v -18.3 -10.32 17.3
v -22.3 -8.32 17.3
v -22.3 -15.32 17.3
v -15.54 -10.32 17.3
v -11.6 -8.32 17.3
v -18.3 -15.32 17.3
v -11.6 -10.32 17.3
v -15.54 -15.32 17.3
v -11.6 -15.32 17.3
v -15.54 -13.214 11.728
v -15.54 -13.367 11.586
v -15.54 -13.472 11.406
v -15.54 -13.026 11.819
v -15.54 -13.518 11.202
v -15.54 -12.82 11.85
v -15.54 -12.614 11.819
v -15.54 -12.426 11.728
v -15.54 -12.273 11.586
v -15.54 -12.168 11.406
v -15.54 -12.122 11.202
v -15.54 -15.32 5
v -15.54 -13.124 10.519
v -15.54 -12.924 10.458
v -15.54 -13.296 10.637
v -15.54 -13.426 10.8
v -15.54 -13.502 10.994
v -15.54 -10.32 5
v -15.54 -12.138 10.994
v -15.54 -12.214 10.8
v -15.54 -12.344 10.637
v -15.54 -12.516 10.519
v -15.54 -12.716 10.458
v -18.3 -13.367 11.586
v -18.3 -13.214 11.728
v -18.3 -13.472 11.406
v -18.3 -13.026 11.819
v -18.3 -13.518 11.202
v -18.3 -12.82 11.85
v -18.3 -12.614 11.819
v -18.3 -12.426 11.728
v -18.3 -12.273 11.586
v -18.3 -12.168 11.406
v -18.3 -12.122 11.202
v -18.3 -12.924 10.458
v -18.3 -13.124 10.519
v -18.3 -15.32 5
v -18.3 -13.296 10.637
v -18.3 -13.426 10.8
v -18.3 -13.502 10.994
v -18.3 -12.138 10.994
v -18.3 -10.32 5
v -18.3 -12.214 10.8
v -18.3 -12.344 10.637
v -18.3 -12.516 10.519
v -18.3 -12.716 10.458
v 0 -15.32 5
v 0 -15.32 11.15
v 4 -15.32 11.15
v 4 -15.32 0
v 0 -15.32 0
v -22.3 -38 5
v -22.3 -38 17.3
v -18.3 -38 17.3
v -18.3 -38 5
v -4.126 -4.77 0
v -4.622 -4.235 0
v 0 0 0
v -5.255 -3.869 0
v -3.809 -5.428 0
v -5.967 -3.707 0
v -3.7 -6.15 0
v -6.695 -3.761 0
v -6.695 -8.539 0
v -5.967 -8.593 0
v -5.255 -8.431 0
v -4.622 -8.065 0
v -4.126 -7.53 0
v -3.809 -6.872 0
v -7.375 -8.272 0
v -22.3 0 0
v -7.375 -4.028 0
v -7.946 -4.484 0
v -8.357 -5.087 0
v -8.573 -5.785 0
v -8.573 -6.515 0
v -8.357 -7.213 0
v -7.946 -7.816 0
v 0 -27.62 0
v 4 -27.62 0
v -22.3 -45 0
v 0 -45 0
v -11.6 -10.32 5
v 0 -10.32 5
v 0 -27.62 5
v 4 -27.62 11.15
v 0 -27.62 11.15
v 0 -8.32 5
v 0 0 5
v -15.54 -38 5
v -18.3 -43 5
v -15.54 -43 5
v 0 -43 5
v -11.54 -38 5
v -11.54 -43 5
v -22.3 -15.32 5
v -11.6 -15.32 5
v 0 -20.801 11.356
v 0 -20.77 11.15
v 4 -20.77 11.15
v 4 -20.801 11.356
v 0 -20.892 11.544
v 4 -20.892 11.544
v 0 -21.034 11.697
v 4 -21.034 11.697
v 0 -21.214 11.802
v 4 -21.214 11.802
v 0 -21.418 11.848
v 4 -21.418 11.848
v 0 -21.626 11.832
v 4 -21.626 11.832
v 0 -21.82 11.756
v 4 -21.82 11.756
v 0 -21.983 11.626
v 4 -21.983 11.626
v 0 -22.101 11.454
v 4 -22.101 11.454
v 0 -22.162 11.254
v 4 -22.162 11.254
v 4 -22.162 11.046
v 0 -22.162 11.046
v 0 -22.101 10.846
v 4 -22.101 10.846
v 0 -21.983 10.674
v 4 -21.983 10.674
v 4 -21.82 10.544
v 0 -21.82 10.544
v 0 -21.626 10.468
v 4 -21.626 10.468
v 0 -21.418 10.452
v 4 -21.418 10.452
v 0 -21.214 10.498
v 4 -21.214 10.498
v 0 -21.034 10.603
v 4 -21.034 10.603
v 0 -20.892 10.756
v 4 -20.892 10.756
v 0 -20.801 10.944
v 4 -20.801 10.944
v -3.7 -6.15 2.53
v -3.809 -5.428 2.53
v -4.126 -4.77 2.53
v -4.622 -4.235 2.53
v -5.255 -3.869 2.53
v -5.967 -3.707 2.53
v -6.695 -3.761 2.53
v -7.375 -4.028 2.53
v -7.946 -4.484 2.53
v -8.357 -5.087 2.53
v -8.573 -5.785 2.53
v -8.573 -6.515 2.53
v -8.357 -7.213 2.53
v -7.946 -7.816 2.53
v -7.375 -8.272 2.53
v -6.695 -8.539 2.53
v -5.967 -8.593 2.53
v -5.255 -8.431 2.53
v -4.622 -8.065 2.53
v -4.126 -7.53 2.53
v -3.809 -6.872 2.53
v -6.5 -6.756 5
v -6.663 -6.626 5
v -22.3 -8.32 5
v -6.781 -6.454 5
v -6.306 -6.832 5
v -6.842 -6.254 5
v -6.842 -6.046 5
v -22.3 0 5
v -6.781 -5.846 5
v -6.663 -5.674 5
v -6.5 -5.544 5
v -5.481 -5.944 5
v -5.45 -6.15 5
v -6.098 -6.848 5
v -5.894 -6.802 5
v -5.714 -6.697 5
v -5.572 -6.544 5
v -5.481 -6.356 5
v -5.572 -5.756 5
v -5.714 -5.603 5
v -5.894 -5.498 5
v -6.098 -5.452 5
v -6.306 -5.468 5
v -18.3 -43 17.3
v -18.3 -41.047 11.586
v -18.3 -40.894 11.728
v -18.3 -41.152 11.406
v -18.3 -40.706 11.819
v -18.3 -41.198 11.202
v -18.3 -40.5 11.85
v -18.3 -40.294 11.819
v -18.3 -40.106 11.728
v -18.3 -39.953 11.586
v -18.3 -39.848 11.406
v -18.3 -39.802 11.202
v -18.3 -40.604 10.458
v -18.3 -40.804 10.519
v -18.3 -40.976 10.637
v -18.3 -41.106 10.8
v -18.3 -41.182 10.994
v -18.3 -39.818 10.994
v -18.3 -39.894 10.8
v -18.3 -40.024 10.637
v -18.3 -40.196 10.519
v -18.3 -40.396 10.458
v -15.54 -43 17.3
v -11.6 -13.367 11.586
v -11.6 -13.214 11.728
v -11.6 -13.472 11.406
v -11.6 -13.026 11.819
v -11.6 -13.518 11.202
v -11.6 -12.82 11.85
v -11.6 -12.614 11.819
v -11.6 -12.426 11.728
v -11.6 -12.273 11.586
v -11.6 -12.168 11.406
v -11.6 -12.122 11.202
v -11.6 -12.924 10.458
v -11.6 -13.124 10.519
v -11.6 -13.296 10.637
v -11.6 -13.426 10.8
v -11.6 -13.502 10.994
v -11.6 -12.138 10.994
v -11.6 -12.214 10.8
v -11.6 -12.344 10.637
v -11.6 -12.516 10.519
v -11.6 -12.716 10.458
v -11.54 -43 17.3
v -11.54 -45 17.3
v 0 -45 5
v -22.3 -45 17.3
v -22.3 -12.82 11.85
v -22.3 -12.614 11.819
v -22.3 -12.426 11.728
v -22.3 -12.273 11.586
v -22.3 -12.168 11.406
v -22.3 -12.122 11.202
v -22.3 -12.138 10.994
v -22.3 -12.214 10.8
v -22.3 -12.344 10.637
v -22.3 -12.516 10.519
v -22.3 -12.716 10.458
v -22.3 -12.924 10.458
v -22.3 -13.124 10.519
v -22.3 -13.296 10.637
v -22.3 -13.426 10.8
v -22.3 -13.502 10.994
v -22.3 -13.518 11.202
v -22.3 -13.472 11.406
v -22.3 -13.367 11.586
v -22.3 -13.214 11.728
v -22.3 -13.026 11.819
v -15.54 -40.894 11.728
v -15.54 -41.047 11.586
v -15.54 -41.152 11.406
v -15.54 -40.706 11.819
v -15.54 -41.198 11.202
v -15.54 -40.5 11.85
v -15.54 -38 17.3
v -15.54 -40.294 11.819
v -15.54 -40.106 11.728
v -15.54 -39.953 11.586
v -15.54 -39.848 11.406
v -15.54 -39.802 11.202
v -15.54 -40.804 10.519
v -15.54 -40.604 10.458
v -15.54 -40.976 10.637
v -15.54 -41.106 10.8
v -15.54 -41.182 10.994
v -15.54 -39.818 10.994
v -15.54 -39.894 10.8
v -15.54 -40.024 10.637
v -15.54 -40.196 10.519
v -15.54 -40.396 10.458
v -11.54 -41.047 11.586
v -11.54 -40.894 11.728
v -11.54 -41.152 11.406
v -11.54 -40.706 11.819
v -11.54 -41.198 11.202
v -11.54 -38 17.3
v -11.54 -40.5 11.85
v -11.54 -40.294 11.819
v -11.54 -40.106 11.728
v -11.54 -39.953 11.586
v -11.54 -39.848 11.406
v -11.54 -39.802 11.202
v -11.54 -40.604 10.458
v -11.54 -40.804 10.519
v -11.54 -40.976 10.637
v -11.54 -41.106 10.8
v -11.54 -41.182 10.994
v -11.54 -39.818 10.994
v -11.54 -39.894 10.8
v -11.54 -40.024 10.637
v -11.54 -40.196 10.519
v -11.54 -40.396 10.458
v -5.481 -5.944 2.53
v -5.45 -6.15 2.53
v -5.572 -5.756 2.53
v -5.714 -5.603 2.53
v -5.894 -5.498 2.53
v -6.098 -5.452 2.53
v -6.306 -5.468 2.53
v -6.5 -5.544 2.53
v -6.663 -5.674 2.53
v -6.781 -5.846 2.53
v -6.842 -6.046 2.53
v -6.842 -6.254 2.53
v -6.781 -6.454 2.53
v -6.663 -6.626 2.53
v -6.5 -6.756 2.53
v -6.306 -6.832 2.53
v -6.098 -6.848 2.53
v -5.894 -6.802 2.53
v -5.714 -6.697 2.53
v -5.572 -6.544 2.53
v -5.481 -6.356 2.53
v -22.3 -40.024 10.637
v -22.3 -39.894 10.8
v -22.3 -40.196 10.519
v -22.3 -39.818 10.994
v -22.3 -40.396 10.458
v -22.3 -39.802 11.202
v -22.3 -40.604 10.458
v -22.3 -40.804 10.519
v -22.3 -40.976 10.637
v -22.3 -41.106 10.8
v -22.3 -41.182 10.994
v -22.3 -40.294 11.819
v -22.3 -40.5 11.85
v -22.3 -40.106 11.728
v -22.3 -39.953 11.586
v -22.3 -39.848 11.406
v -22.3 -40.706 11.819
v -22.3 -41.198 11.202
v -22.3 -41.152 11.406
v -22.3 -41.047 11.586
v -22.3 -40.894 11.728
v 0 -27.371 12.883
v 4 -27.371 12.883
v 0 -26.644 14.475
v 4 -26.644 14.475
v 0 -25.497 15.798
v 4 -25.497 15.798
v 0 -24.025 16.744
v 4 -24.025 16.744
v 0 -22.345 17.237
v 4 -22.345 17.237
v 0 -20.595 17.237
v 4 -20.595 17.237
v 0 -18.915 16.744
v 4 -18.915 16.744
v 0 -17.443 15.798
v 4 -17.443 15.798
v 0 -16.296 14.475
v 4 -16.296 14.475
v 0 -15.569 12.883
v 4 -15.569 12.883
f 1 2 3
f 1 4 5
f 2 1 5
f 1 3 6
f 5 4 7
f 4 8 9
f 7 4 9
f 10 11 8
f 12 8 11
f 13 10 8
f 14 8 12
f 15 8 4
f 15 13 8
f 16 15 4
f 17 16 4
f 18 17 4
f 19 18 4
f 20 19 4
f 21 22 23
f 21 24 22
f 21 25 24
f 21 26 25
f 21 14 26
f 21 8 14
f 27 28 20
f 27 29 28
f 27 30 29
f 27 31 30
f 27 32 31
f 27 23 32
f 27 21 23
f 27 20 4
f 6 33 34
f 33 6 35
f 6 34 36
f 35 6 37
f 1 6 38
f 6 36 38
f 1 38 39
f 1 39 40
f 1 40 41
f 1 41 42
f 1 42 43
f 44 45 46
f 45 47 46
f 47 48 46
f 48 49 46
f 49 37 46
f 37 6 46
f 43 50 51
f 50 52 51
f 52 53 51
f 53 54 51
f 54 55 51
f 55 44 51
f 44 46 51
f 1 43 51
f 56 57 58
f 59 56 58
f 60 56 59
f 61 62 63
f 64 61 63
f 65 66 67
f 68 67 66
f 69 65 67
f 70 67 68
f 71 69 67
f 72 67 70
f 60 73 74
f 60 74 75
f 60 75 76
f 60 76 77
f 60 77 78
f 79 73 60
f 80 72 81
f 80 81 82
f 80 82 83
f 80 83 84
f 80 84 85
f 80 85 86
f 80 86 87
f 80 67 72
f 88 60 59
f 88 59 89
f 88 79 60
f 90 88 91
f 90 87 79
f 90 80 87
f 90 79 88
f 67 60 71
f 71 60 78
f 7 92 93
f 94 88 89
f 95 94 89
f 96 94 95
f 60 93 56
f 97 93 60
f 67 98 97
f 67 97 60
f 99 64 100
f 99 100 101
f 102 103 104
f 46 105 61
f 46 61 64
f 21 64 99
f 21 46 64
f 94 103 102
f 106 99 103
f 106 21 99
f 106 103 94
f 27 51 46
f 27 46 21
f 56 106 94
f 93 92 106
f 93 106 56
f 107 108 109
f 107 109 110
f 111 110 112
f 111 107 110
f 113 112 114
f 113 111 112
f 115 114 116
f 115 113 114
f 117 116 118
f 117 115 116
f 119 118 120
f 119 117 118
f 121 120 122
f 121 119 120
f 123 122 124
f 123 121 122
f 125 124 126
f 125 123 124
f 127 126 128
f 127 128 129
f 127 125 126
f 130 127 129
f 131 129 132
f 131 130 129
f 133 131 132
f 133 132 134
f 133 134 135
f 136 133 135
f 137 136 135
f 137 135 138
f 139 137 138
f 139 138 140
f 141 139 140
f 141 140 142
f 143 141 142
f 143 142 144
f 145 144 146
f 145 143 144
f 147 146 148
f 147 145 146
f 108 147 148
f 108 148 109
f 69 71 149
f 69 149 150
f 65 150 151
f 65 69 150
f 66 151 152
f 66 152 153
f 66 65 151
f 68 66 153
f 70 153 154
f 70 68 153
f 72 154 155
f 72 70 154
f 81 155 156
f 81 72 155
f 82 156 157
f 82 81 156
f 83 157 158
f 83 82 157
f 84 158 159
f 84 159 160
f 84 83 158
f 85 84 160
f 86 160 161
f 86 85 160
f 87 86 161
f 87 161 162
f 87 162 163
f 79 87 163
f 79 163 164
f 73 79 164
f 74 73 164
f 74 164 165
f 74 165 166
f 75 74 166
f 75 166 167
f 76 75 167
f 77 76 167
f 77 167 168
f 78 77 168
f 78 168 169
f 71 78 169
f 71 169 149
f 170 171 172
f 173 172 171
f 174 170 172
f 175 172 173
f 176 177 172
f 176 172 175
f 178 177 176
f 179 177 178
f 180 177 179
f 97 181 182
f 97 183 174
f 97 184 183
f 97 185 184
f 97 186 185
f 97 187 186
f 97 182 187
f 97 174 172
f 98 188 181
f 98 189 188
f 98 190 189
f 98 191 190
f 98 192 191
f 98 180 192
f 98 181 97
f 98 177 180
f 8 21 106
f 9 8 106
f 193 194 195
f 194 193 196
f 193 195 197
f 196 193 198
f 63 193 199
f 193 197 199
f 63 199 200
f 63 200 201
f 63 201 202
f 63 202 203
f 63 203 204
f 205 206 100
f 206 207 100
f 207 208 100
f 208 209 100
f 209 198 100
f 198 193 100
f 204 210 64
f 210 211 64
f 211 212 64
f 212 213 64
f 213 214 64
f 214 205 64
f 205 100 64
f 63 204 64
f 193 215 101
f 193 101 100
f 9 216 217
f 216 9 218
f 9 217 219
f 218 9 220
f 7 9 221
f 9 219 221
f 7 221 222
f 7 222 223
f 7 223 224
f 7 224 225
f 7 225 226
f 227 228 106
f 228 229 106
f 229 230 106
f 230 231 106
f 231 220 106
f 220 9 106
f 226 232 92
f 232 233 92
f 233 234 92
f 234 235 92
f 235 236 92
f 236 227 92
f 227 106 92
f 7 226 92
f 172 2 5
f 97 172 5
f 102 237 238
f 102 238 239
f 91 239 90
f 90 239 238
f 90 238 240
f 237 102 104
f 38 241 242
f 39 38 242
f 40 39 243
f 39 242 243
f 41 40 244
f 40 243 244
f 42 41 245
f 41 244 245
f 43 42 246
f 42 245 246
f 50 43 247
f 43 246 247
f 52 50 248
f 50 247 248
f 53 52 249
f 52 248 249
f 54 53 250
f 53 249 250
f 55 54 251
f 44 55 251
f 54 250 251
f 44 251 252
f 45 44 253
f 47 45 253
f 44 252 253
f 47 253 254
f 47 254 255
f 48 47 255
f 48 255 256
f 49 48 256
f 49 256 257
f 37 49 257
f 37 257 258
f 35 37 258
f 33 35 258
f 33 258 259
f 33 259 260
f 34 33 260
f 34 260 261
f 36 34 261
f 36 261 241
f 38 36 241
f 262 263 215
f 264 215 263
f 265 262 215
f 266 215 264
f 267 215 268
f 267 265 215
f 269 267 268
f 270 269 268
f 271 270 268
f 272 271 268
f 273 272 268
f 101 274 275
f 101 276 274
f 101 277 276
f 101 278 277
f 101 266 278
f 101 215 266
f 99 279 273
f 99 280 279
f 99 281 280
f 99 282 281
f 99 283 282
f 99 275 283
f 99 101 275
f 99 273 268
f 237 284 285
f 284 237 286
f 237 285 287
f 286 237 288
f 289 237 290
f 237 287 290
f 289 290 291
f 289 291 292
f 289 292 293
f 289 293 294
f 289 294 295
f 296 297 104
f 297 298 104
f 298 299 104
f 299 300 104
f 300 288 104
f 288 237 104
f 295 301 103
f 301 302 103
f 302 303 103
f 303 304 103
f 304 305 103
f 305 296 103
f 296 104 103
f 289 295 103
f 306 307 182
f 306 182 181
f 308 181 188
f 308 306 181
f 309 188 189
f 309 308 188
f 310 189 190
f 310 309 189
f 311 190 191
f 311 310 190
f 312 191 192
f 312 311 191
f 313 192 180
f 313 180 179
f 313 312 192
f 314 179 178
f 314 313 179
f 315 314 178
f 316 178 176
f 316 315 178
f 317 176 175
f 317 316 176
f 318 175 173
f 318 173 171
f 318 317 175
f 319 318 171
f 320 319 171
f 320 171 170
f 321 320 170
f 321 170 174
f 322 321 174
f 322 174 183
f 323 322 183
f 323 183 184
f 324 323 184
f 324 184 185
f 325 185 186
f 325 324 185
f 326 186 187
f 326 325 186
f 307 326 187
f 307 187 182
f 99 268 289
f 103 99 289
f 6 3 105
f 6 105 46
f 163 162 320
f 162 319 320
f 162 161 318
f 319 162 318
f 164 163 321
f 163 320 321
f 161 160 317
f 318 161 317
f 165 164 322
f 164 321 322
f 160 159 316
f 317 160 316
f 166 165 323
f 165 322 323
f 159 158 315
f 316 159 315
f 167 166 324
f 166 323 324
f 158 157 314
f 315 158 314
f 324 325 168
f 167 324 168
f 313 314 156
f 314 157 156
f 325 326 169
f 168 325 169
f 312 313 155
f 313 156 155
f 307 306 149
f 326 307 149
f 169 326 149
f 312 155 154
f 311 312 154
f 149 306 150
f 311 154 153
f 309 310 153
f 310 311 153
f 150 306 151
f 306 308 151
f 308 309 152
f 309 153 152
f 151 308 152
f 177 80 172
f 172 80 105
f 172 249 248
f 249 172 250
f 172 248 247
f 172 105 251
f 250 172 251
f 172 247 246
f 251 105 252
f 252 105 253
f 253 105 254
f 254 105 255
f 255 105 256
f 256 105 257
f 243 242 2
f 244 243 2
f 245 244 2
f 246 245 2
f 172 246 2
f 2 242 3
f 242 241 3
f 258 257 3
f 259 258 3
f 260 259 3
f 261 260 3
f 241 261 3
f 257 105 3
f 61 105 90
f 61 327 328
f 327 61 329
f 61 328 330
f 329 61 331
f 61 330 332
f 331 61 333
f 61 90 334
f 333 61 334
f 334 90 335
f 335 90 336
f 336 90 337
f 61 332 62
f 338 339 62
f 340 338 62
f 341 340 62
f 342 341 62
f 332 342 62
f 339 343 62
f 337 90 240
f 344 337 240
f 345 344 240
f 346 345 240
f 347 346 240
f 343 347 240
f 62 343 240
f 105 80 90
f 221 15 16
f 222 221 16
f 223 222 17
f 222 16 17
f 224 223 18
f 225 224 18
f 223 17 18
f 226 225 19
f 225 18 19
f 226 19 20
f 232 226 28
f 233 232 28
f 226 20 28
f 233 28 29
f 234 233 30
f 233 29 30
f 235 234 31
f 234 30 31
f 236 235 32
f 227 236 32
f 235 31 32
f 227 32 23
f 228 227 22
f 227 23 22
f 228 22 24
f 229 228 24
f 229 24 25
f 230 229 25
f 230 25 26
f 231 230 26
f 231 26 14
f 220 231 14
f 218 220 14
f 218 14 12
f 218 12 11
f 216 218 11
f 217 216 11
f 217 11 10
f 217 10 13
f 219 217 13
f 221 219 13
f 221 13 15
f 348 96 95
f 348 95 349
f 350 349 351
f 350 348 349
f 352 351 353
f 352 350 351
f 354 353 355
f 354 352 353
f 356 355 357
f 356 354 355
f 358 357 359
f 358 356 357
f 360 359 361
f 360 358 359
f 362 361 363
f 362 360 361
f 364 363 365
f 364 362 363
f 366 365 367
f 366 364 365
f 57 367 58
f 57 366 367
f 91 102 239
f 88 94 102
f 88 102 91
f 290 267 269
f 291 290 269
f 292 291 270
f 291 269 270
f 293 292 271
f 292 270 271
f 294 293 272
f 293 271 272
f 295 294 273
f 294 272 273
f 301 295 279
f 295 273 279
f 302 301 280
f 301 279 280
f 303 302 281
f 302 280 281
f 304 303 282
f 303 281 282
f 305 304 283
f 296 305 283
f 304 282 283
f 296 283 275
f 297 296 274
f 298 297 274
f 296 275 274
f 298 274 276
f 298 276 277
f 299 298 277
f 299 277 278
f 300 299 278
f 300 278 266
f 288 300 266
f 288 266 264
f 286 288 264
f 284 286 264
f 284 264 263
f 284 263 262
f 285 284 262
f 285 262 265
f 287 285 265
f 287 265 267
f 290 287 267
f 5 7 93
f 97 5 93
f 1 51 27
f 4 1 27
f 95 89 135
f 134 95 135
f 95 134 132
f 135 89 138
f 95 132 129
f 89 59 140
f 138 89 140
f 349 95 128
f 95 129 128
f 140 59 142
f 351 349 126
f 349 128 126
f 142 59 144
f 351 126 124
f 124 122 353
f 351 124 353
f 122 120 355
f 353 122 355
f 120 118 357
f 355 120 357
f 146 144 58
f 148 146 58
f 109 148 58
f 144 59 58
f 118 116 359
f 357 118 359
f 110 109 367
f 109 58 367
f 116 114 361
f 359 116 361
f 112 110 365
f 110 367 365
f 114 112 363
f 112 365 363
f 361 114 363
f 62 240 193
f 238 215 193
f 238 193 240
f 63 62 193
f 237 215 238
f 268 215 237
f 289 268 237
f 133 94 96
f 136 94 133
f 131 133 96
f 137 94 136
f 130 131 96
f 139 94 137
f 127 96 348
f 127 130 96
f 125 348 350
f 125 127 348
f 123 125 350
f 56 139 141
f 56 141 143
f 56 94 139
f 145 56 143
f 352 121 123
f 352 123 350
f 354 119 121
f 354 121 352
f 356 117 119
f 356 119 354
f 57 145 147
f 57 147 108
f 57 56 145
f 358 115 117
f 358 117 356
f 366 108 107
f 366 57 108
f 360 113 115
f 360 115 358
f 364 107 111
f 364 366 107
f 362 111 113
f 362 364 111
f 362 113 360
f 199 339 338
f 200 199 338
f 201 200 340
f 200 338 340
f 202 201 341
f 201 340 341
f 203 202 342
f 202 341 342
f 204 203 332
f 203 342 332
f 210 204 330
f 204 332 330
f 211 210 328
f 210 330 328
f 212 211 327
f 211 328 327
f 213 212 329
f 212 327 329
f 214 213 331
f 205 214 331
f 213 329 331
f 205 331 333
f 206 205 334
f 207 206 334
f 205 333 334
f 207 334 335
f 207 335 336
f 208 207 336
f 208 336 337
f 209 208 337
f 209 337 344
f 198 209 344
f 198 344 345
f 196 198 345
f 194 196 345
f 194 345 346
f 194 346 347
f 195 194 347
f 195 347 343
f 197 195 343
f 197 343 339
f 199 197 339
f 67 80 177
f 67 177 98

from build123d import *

# Parameters (mm, degrees)
ESQUISSE1_W             = 22.3
ESQUISSE1_H             = 43
ESQUISSE1_R             = 2.45
BOSS_EXTRU_1_DEPTH      = 5
BOSS_EXTRU_2_START      = -2.47
ESQUISSE2_R             = 2.45
ESQUISSE2_R_2           = 0.7
BOSS_EXTRU_2_DEPTH      = 2.47
ESQUISSE3_W             = 4
ESQUISSE3_H             = 5
ESQUISSE3_W_2           = 3.94
BOSS_EXTRU_3_DEPTH      = 12.3
ESQUISSE4_R             = 0.7
ENL_V_MAT_EXTRU_1_DEPTH = 52.435201954
BOSS_EXTRU_4_DEPTH      = 2
BOSS_EXTRU_5_DEPTH      = 2
ESQUISSE7_R             = 0.7
BOSS_EXTRU_6_DEPTH      = 4


with BuildPart() as part:
    # Esquisse1 → Boss.-Extru.1 (new body)
    with BuildSketch(Plane.XY):
        with Locations((-11.15, -21.5)):
            Rectangle(ESQUISSE1_W, ESQUISSE1_H)
        with Locations((-6.15, -6.15)):
            Circle(ESQUISSE1_R, mode=Mode.SUBTRACT)
    extrude(amount=BOSS_EXTRU_1_DEPTH)

    # Esquisse2 → Boss.-Extru.2 (add)
    with BuildSketch(Plane.XY.offset(5).offset(BOSS_EXTRU_2_START)):
        with Locations((-6.15, -6.15)):
            Circle(ESQUISSE2_R)
        with Locations((-6.15, -6.15)):
            Circle(ESQUISSE2_R_2, mode=Mode.SUBTRACT)
    extrude(amount=BOSS_EXTRU_2_DEPTH)

    # Esquisse3 → Boss.-Extru.3 (add)
    with BuildSketch(Plane.XY.offset(5)):
        with Locations((-20.3, -40.5)):
            Rectangle(ESQUISSE3_W, ESQUISSE3_H)
        with Locations((-13.54, -40.5)):
            Rectangle(ESQUISSE3_W, ESQUISSE3_H)
        with Locations((-20.3, -12.82)):
            Rectangle(ESQUISSE3_W, ESQUISSE3_H)
        with Locations((-13.57, -12.82)):
            Rectangle(ESQUISSE3_W_2, ESQUISSE3_H)
    extrude(amount=BOSS_EXTRU_3_DEPTH)

    # Esquisse4 → Enlèv. mat.-Extru.1 (cut, through all)
    with BuildSketch(Plane.ZY.offset(22.3)):
        with Locations((11.15, -12.82)):
            Circle(ESQUISSE4_R)
        with Locations((11.15, -40.5)):
            Circle(ESQUISSE4_R)
    extrude(amount=-ENL_V_MAT_EXTRU_1_DEPTH, mode=Mode.SUBTRACT)

    # Esquisse5 → Boss.-Extru.4 (add)
    with BuildSketch(Plane.XZ.offset(43)):
        Polygon((-22.3, 17.3), (-11.54, 17.3), (0, 5), (0, 0), (-22.3, 0), align=None)
    extrude(amount=BOSS_EXTRU_4_DEPTH)

    # Esquisse6 → Boss.-Extru.5 (add)
    with BuildSketch(Plane(origin=(0, -10.32, 0), x_dir=(1, 0, 0), z_dir=(0, 1, 0))):
        Polygon((-22.3, -5), (-22.3, -17.3), (-11.6, -17.3), (0, -5), align=None)
    extrude(amount=BOSS_EXTRU_5_DEPTH)

    # Esquisse7 → Boss.-Extru.6 (add)
    with BuildSketch(Plane(origin=(0, 0, 0), x_dir=(0, 0, -1), z_dir=(1, 0, 0))):
        with BuildLine():
            Line((-11.15, -15.32), (0, -15.32))
            Line((0, -15.32), (0, -27.62))
            Line((0, -27.62), (-11.15, -27.62))
            ThreePointArc((-11.15, -27.62), (-17.3, -21.47), (-11.15, -15.32))
        make_face()
        with Locations(Location((-11.15, -21.47, 0), (0, 0, 90))):
            Circle(ESQUISSE7_R, mode=Mode.SUBTRACT)
    extrude(amount=BOSS_EXTRU_6_DEPTH)


solid = part.part
